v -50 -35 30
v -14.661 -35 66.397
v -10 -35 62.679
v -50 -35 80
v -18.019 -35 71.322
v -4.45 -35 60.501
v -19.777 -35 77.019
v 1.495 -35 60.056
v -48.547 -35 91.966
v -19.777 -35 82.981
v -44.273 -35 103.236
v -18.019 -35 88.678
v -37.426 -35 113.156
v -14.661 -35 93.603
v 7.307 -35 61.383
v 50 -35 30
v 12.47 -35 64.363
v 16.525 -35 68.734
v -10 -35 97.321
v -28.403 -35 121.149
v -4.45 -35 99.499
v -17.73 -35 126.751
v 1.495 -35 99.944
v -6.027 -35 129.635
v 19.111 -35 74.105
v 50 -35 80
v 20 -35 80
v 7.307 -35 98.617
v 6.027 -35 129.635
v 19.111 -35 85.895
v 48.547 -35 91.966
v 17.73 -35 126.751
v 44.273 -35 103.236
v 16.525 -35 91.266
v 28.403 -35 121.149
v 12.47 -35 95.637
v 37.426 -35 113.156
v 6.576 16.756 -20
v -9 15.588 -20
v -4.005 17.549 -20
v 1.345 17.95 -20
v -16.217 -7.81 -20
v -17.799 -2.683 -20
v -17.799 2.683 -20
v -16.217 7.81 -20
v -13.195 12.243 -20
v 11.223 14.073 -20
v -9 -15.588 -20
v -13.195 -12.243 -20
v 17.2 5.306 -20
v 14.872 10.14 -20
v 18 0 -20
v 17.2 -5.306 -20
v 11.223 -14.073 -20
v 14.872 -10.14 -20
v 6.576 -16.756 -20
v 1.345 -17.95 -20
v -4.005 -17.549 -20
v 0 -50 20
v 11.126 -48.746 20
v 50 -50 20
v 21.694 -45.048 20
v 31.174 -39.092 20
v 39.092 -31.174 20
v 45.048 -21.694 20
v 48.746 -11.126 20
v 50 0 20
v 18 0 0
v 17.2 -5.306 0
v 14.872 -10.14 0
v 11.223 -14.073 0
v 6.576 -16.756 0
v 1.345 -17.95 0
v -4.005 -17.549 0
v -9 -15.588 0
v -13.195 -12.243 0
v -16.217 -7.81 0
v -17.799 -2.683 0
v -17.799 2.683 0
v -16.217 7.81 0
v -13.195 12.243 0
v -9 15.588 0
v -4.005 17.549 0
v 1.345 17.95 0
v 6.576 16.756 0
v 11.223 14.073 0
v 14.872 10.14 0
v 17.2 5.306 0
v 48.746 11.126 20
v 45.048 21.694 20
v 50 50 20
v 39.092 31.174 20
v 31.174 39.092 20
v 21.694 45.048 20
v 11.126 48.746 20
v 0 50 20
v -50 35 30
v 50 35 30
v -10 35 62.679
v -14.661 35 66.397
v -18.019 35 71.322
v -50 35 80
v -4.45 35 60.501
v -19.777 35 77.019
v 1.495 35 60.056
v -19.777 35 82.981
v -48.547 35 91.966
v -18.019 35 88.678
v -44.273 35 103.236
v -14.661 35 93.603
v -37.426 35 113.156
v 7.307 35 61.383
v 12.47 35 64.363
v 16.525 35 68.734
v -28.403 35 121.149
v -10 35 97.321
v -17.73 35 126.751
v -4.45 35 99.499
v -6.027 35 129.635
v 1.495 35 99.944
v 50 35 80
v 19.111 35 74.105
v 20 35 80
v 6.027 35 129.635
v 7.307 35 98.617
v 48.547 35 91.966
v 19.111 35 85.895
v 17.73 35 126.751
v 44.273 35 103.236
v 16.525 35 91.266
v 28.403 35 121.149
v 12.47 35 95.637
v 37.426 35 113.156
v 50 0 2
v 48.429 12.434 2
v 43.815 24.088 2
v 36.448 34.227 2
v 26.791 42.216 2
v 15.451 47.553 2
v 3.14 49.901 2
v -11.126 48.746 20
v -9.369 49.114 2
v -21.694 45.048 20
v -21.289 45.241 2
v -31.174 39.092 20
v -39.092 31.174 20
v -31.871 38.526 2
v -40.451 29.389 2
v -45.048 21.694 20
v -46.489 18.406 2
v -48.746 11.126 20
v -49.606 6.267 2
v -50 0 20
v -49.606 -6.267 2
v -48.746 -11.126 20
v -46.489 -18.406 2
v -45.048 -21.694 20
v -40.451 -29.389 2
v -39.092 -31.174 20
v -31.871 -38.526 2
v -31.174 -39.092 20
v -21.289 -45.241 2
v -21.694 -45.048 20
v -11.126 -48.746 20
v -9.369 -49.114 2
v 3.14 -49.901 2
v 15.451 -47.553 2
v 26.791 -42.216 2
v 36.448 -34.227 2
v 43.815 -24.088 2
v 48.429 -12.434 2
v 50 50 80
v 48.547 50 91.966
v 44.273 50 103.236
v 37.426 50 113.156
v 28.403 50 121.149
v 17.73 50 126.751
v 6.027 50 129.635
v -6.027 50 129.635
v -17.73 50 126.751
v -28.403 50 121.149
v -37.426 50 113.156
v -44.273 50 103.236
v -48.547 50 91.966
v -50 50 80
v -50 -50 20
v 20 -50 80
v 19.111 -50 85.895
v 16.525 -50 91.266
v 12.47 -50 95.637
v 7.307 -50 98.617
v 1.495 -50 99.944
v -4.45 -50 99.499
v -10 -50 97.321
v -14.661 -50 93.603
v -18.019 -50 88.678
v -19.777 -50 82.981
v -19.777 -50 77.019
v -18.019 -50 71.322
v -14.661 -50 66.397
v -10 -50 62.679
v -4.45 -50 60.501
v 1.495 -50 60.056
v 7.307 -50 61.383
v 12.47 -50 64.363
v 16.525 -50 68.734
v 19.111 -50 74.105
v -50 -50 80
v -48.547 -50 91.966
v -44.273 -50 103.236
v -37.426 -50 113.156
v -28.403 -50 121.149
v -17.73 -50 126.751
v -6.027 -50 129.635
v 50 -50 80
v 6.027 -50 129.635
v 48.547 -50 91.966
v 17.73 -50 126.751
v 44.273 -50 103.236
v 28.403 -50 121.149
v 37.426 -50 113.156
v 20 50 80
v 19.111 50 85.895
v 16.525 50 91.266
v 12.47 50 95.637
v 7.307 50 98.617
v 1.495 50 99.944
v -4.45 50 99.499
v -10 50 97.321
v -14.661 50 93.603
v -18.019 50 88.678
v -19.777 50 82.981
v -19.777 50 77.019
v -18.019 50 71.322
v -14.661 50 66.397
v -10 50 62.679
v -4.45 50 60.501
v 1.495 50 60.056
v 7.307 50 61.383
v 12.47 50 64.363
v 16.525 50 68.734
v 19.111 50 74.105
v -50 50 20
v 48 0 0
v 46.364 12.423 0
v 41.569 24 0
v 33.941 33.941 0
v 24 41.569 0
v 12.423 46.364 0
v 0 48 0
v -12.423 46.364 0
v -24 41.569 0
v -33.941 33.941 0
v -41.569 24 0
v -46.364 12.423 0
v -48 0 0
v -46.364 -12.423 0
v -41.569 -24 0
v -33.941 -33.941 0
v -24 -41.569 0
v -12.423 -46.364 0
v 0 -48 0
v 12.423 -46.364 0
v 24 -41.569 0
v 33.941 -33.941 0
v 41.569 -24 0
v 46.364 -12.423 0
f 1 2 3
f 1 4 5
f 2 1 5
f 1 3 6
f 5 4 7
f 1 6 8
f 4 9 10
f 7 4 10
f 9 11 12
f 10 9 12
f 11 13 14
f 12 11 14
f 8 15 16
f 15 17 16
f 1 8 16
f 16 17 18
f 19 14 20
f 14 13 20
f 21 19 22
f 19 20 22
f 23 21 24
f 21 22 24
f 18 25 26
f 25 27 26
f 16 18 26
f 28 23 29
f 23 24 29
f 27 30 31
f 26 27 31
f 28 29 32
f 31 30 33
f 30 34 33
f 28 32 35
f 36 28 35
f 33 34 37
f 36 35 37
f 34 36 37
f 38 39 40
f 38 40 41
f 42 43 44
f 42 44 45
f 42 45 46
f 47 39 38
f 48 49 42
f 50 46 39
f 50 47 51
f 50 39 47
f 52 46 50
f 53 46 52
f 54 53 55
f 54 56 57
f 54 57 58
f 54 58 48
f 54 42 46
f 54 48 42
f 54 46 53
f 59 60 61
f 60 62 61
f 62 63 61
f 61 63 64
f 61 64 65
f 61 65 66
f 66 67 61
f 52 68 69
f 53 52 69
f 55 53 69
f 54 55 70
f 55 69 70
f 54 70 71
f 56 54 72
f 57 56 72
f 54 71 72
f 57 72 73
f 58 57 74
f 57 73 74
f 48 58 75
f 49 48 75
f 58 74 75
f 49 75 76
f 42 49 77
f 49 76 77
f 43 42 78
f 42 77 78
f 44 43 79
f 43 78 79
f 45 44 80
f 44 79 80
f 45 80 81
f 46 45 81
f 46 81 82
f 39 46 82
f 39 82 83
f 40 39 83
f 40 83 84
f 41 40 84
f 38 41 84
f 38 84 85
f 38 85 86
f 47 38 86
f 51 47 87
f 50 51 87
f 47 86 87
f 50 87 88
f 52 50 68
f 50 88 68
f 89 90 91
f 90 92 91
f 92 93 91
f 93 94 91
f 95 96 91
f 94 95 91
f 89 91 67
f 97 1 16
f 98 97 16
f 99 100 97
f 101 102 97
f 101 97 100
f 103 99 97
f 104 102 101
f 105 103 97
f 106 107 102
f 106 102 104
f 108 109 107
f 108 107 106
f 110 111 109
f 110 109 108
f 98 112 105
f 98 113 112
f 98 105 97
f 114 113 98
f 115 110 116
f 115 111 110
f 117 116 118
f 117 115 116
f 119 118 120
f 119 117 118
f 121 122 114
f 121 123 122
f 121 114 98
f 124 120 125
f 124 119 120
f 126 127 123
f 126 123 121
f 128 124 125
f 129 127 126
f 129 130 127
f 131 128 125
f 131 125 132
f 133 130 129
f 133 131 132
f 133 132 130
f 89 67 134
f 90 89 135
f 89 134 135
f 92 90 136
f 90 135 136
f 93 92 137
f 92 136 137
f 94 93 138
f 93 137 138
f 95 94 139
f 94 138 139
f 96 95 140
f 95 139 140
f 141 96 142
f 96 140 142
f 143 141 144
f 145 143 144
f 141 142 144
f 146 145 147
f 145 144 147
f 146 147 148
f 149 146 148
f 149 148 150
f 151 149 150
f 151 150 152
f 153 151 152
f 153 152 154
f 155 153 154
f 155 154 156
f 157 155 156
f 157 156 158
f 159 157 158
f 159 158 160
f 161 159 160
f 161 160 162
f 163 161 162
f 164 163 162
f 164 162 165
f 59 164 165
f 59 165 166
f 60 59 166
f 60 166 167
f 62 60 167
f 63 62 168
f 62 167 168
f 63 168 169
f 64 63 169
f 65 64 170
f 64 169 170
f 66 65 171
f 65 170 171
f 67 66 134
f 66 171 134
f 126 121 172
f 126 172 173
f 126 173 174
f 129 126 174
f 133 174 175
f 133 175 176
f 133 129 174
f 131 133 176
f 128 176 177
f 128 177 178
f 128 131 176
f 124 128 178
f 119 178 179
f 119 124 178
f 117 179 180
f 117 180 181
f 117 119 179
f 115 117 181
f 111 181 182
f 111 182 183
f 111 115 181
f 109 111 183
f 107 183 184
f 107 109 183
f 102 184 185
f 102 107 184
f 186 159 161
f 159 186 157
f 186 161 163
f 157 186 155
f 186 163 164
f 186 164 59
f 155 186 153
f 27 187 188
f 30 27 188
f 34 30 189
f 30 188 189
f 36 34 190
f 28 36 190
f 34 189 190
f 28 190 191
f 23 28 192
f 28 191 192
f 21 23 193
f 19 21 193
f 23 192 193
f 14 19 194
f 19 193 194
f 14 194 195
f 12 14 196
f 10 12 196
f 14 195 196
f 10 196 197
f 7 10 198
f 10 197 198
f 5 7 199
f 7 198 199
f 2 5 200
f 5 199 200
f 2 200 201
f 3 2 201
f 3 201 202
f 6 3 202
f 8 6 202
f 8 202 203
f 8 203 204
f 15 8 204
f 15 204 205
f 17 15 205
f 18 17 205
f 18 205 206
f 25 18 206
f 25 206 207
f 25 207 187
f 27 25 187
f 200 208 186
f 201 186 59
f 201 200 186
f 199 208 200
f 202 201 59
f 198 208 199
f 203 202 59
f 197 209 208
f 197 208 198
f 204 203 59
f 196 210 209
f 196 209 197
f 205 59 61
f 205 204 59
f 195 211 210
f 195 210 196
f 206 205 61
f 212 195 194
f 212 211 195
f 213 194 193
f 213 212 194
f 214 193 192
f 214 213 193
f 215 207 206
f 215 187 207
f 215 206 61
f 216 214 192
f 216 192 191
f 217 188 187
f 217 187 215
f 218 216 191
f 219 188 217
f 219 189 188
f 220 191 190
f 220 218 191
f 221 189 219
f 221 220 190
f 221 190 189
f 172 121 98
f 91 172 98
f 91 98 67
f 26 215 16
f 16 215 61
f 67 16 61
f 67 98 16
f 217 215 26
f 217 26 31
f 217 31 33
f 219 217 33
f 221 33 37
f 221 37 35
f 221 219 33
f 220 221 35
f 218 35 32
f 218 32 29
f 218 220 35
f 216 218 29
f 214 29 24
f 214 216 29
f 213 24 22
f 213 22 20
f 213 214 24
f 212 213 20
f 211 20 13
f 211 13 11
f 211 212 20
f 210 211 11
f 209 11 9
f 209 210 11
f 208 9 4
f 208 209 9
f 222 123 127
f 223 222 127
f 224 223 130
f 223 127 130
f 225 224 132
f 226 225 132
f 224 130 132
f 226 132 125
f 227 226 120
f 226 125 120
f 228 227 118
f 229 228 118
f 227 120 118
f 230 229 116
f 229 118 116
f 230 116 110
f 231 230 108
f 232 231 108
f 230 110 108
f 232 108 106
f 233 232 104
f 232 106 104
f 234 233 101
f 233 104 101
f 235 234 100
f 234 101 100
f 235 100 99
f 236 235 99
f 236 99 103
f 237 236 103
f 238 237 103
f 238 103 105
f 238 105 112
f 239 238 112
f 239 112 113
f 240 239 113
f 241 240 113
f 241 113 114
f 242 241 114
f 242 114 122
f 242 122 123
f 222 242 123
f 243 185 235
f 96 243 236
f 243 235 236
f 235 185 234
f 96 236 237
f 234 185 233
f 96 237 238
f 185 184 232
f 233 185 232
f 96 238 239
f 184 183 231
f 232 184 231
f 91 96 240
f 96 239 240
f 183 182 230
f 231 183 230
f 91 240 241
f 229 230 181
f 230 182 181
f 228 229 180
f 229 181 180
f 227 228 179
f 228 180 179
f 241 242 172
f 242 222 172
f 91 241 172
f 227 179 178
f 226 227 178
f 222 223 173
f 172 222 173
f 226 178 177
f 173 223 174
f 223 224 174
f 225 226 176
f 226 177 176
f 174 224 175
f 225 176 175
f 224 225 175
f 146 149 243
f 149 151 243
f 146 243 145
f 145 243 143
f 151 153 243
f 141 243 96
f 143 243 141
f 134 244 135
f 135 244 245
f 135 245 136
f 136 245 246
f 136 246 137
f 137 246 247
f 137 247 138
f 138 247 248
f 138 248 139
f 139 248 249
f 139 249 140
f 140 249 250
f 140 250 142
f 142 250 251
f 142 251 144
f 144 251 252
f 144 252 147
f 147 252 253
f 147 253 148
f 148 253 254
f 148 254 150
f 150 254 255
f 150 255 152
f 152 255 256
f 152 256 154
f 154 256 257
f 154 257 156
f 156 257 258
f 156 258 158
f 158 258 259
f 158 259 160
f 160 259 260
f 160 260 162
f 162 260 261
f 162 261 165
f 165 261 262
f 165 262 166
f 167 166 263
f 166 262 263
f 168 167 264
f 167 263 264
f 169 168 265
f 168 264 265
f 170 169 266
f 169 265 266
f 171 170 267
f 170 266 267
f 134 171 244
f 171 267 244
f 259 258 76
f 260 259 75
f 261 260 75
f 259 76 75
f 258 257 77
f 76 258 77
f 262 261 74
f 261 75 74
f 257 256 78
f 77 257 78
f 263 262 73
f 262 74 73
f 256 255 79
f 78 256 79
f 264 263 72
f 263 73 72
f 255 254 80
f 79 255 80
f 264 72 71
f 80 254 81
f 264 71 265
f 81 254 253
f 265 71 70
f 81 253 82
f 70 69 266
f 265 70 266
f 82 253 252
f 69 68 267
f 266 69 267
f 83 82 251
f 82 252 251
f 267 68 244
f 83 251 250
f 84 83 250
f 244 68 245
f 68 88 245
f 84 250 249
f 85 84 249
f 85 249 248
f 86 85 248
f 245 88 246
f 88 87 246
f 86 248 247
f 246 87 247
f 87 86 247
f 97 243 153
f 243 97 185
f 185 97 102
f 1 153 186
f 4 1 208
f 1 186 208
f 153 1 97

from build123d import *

# Parameters (mm, degrees)
SKETCH_R        = 50
PAD_DEPTH       = 20
CHAMFER_SIZE    = 2
SKETCH001_R     = 18
PAD001_DEPTH    = 20
SKETCH002_W     = 100
SKETCH002_H     = 100
PAD002_DEPTH    = 10
PAD003_DEPTH    = 50
SKETCH004_R     = 20
POCKET_DEPTH    = 101
SKETCH005_W     = 100
SKETCH005_H     = 101
POCKET001_DEPTH = 35


with BuildPart() as part:
    # Sketch → Pad (new body)
    with BuildSketch(Plane.XY):
        Circle(SKETCH_R)
    extrude(amount=PAD_DEPTH)

    # Chamfer
    chamfer_edges = [part.edges().sort_by_distance(p)[0] for p in [
        (-50, 0, 0),
    ]]
    chamfer(chamfer_edges, length=CHAMFER_SIZE)

    # Sketch001 (on Face4 of Chamfer) → Pad001 (join)
    with BuildSketch(Plane(origin=(0, 0, 0), x_dir=(1, 0, 0), z_dir=(0, 0, -1))):
        Circle(SKETCH001_R)
    extrude(amount=PAD001_DEPTH)

    # Sketch002 (on Face3 of Pad001) → Pad002 (join)
    with BuildSketch(Plane.XY.offset(20)):
        Rectangle(SKETCH002_W, SKETCH002_H)
    extrude(amount=PAD002_DEPTH)

    # Sketch003 → Pad003 (join, symmetric)
    with BuildSketch(Plane.XZ):
        with BuildLine():
            ThreePointArc((50, 80), (0, 130), (-50, 80))
            Line((-50, 30), (-50, 80))
            Line((50, 30), (-50, 30))
            Line((50, 80), (50, 30))
        make_face()
    extrude(amount=PAD003_DEPTH, both=True)

    # Sketch004 (on Face13 of Pad003) → Pocket (cut)
    with BuildSketch(Plane.XZ.offset(50)):
        with Locations((0, 80)):
            Circle(SKETCH004_R)
    extrude(amount=-POCKET_DEPTH, mode=Mode.SUBTRACT)

    # Sketch005 → Pocket001 (cut, symmetric)
    with BuildSketch(Plane.XZ):
        with Locations((0, 80.5)):
            Rectangle(SKETCH005_W, SKETCH005_H)
    extrude(amount=POCKET001_DEPTH, both=True, mode=Mode.SUBTRACT)


solid = part.part
